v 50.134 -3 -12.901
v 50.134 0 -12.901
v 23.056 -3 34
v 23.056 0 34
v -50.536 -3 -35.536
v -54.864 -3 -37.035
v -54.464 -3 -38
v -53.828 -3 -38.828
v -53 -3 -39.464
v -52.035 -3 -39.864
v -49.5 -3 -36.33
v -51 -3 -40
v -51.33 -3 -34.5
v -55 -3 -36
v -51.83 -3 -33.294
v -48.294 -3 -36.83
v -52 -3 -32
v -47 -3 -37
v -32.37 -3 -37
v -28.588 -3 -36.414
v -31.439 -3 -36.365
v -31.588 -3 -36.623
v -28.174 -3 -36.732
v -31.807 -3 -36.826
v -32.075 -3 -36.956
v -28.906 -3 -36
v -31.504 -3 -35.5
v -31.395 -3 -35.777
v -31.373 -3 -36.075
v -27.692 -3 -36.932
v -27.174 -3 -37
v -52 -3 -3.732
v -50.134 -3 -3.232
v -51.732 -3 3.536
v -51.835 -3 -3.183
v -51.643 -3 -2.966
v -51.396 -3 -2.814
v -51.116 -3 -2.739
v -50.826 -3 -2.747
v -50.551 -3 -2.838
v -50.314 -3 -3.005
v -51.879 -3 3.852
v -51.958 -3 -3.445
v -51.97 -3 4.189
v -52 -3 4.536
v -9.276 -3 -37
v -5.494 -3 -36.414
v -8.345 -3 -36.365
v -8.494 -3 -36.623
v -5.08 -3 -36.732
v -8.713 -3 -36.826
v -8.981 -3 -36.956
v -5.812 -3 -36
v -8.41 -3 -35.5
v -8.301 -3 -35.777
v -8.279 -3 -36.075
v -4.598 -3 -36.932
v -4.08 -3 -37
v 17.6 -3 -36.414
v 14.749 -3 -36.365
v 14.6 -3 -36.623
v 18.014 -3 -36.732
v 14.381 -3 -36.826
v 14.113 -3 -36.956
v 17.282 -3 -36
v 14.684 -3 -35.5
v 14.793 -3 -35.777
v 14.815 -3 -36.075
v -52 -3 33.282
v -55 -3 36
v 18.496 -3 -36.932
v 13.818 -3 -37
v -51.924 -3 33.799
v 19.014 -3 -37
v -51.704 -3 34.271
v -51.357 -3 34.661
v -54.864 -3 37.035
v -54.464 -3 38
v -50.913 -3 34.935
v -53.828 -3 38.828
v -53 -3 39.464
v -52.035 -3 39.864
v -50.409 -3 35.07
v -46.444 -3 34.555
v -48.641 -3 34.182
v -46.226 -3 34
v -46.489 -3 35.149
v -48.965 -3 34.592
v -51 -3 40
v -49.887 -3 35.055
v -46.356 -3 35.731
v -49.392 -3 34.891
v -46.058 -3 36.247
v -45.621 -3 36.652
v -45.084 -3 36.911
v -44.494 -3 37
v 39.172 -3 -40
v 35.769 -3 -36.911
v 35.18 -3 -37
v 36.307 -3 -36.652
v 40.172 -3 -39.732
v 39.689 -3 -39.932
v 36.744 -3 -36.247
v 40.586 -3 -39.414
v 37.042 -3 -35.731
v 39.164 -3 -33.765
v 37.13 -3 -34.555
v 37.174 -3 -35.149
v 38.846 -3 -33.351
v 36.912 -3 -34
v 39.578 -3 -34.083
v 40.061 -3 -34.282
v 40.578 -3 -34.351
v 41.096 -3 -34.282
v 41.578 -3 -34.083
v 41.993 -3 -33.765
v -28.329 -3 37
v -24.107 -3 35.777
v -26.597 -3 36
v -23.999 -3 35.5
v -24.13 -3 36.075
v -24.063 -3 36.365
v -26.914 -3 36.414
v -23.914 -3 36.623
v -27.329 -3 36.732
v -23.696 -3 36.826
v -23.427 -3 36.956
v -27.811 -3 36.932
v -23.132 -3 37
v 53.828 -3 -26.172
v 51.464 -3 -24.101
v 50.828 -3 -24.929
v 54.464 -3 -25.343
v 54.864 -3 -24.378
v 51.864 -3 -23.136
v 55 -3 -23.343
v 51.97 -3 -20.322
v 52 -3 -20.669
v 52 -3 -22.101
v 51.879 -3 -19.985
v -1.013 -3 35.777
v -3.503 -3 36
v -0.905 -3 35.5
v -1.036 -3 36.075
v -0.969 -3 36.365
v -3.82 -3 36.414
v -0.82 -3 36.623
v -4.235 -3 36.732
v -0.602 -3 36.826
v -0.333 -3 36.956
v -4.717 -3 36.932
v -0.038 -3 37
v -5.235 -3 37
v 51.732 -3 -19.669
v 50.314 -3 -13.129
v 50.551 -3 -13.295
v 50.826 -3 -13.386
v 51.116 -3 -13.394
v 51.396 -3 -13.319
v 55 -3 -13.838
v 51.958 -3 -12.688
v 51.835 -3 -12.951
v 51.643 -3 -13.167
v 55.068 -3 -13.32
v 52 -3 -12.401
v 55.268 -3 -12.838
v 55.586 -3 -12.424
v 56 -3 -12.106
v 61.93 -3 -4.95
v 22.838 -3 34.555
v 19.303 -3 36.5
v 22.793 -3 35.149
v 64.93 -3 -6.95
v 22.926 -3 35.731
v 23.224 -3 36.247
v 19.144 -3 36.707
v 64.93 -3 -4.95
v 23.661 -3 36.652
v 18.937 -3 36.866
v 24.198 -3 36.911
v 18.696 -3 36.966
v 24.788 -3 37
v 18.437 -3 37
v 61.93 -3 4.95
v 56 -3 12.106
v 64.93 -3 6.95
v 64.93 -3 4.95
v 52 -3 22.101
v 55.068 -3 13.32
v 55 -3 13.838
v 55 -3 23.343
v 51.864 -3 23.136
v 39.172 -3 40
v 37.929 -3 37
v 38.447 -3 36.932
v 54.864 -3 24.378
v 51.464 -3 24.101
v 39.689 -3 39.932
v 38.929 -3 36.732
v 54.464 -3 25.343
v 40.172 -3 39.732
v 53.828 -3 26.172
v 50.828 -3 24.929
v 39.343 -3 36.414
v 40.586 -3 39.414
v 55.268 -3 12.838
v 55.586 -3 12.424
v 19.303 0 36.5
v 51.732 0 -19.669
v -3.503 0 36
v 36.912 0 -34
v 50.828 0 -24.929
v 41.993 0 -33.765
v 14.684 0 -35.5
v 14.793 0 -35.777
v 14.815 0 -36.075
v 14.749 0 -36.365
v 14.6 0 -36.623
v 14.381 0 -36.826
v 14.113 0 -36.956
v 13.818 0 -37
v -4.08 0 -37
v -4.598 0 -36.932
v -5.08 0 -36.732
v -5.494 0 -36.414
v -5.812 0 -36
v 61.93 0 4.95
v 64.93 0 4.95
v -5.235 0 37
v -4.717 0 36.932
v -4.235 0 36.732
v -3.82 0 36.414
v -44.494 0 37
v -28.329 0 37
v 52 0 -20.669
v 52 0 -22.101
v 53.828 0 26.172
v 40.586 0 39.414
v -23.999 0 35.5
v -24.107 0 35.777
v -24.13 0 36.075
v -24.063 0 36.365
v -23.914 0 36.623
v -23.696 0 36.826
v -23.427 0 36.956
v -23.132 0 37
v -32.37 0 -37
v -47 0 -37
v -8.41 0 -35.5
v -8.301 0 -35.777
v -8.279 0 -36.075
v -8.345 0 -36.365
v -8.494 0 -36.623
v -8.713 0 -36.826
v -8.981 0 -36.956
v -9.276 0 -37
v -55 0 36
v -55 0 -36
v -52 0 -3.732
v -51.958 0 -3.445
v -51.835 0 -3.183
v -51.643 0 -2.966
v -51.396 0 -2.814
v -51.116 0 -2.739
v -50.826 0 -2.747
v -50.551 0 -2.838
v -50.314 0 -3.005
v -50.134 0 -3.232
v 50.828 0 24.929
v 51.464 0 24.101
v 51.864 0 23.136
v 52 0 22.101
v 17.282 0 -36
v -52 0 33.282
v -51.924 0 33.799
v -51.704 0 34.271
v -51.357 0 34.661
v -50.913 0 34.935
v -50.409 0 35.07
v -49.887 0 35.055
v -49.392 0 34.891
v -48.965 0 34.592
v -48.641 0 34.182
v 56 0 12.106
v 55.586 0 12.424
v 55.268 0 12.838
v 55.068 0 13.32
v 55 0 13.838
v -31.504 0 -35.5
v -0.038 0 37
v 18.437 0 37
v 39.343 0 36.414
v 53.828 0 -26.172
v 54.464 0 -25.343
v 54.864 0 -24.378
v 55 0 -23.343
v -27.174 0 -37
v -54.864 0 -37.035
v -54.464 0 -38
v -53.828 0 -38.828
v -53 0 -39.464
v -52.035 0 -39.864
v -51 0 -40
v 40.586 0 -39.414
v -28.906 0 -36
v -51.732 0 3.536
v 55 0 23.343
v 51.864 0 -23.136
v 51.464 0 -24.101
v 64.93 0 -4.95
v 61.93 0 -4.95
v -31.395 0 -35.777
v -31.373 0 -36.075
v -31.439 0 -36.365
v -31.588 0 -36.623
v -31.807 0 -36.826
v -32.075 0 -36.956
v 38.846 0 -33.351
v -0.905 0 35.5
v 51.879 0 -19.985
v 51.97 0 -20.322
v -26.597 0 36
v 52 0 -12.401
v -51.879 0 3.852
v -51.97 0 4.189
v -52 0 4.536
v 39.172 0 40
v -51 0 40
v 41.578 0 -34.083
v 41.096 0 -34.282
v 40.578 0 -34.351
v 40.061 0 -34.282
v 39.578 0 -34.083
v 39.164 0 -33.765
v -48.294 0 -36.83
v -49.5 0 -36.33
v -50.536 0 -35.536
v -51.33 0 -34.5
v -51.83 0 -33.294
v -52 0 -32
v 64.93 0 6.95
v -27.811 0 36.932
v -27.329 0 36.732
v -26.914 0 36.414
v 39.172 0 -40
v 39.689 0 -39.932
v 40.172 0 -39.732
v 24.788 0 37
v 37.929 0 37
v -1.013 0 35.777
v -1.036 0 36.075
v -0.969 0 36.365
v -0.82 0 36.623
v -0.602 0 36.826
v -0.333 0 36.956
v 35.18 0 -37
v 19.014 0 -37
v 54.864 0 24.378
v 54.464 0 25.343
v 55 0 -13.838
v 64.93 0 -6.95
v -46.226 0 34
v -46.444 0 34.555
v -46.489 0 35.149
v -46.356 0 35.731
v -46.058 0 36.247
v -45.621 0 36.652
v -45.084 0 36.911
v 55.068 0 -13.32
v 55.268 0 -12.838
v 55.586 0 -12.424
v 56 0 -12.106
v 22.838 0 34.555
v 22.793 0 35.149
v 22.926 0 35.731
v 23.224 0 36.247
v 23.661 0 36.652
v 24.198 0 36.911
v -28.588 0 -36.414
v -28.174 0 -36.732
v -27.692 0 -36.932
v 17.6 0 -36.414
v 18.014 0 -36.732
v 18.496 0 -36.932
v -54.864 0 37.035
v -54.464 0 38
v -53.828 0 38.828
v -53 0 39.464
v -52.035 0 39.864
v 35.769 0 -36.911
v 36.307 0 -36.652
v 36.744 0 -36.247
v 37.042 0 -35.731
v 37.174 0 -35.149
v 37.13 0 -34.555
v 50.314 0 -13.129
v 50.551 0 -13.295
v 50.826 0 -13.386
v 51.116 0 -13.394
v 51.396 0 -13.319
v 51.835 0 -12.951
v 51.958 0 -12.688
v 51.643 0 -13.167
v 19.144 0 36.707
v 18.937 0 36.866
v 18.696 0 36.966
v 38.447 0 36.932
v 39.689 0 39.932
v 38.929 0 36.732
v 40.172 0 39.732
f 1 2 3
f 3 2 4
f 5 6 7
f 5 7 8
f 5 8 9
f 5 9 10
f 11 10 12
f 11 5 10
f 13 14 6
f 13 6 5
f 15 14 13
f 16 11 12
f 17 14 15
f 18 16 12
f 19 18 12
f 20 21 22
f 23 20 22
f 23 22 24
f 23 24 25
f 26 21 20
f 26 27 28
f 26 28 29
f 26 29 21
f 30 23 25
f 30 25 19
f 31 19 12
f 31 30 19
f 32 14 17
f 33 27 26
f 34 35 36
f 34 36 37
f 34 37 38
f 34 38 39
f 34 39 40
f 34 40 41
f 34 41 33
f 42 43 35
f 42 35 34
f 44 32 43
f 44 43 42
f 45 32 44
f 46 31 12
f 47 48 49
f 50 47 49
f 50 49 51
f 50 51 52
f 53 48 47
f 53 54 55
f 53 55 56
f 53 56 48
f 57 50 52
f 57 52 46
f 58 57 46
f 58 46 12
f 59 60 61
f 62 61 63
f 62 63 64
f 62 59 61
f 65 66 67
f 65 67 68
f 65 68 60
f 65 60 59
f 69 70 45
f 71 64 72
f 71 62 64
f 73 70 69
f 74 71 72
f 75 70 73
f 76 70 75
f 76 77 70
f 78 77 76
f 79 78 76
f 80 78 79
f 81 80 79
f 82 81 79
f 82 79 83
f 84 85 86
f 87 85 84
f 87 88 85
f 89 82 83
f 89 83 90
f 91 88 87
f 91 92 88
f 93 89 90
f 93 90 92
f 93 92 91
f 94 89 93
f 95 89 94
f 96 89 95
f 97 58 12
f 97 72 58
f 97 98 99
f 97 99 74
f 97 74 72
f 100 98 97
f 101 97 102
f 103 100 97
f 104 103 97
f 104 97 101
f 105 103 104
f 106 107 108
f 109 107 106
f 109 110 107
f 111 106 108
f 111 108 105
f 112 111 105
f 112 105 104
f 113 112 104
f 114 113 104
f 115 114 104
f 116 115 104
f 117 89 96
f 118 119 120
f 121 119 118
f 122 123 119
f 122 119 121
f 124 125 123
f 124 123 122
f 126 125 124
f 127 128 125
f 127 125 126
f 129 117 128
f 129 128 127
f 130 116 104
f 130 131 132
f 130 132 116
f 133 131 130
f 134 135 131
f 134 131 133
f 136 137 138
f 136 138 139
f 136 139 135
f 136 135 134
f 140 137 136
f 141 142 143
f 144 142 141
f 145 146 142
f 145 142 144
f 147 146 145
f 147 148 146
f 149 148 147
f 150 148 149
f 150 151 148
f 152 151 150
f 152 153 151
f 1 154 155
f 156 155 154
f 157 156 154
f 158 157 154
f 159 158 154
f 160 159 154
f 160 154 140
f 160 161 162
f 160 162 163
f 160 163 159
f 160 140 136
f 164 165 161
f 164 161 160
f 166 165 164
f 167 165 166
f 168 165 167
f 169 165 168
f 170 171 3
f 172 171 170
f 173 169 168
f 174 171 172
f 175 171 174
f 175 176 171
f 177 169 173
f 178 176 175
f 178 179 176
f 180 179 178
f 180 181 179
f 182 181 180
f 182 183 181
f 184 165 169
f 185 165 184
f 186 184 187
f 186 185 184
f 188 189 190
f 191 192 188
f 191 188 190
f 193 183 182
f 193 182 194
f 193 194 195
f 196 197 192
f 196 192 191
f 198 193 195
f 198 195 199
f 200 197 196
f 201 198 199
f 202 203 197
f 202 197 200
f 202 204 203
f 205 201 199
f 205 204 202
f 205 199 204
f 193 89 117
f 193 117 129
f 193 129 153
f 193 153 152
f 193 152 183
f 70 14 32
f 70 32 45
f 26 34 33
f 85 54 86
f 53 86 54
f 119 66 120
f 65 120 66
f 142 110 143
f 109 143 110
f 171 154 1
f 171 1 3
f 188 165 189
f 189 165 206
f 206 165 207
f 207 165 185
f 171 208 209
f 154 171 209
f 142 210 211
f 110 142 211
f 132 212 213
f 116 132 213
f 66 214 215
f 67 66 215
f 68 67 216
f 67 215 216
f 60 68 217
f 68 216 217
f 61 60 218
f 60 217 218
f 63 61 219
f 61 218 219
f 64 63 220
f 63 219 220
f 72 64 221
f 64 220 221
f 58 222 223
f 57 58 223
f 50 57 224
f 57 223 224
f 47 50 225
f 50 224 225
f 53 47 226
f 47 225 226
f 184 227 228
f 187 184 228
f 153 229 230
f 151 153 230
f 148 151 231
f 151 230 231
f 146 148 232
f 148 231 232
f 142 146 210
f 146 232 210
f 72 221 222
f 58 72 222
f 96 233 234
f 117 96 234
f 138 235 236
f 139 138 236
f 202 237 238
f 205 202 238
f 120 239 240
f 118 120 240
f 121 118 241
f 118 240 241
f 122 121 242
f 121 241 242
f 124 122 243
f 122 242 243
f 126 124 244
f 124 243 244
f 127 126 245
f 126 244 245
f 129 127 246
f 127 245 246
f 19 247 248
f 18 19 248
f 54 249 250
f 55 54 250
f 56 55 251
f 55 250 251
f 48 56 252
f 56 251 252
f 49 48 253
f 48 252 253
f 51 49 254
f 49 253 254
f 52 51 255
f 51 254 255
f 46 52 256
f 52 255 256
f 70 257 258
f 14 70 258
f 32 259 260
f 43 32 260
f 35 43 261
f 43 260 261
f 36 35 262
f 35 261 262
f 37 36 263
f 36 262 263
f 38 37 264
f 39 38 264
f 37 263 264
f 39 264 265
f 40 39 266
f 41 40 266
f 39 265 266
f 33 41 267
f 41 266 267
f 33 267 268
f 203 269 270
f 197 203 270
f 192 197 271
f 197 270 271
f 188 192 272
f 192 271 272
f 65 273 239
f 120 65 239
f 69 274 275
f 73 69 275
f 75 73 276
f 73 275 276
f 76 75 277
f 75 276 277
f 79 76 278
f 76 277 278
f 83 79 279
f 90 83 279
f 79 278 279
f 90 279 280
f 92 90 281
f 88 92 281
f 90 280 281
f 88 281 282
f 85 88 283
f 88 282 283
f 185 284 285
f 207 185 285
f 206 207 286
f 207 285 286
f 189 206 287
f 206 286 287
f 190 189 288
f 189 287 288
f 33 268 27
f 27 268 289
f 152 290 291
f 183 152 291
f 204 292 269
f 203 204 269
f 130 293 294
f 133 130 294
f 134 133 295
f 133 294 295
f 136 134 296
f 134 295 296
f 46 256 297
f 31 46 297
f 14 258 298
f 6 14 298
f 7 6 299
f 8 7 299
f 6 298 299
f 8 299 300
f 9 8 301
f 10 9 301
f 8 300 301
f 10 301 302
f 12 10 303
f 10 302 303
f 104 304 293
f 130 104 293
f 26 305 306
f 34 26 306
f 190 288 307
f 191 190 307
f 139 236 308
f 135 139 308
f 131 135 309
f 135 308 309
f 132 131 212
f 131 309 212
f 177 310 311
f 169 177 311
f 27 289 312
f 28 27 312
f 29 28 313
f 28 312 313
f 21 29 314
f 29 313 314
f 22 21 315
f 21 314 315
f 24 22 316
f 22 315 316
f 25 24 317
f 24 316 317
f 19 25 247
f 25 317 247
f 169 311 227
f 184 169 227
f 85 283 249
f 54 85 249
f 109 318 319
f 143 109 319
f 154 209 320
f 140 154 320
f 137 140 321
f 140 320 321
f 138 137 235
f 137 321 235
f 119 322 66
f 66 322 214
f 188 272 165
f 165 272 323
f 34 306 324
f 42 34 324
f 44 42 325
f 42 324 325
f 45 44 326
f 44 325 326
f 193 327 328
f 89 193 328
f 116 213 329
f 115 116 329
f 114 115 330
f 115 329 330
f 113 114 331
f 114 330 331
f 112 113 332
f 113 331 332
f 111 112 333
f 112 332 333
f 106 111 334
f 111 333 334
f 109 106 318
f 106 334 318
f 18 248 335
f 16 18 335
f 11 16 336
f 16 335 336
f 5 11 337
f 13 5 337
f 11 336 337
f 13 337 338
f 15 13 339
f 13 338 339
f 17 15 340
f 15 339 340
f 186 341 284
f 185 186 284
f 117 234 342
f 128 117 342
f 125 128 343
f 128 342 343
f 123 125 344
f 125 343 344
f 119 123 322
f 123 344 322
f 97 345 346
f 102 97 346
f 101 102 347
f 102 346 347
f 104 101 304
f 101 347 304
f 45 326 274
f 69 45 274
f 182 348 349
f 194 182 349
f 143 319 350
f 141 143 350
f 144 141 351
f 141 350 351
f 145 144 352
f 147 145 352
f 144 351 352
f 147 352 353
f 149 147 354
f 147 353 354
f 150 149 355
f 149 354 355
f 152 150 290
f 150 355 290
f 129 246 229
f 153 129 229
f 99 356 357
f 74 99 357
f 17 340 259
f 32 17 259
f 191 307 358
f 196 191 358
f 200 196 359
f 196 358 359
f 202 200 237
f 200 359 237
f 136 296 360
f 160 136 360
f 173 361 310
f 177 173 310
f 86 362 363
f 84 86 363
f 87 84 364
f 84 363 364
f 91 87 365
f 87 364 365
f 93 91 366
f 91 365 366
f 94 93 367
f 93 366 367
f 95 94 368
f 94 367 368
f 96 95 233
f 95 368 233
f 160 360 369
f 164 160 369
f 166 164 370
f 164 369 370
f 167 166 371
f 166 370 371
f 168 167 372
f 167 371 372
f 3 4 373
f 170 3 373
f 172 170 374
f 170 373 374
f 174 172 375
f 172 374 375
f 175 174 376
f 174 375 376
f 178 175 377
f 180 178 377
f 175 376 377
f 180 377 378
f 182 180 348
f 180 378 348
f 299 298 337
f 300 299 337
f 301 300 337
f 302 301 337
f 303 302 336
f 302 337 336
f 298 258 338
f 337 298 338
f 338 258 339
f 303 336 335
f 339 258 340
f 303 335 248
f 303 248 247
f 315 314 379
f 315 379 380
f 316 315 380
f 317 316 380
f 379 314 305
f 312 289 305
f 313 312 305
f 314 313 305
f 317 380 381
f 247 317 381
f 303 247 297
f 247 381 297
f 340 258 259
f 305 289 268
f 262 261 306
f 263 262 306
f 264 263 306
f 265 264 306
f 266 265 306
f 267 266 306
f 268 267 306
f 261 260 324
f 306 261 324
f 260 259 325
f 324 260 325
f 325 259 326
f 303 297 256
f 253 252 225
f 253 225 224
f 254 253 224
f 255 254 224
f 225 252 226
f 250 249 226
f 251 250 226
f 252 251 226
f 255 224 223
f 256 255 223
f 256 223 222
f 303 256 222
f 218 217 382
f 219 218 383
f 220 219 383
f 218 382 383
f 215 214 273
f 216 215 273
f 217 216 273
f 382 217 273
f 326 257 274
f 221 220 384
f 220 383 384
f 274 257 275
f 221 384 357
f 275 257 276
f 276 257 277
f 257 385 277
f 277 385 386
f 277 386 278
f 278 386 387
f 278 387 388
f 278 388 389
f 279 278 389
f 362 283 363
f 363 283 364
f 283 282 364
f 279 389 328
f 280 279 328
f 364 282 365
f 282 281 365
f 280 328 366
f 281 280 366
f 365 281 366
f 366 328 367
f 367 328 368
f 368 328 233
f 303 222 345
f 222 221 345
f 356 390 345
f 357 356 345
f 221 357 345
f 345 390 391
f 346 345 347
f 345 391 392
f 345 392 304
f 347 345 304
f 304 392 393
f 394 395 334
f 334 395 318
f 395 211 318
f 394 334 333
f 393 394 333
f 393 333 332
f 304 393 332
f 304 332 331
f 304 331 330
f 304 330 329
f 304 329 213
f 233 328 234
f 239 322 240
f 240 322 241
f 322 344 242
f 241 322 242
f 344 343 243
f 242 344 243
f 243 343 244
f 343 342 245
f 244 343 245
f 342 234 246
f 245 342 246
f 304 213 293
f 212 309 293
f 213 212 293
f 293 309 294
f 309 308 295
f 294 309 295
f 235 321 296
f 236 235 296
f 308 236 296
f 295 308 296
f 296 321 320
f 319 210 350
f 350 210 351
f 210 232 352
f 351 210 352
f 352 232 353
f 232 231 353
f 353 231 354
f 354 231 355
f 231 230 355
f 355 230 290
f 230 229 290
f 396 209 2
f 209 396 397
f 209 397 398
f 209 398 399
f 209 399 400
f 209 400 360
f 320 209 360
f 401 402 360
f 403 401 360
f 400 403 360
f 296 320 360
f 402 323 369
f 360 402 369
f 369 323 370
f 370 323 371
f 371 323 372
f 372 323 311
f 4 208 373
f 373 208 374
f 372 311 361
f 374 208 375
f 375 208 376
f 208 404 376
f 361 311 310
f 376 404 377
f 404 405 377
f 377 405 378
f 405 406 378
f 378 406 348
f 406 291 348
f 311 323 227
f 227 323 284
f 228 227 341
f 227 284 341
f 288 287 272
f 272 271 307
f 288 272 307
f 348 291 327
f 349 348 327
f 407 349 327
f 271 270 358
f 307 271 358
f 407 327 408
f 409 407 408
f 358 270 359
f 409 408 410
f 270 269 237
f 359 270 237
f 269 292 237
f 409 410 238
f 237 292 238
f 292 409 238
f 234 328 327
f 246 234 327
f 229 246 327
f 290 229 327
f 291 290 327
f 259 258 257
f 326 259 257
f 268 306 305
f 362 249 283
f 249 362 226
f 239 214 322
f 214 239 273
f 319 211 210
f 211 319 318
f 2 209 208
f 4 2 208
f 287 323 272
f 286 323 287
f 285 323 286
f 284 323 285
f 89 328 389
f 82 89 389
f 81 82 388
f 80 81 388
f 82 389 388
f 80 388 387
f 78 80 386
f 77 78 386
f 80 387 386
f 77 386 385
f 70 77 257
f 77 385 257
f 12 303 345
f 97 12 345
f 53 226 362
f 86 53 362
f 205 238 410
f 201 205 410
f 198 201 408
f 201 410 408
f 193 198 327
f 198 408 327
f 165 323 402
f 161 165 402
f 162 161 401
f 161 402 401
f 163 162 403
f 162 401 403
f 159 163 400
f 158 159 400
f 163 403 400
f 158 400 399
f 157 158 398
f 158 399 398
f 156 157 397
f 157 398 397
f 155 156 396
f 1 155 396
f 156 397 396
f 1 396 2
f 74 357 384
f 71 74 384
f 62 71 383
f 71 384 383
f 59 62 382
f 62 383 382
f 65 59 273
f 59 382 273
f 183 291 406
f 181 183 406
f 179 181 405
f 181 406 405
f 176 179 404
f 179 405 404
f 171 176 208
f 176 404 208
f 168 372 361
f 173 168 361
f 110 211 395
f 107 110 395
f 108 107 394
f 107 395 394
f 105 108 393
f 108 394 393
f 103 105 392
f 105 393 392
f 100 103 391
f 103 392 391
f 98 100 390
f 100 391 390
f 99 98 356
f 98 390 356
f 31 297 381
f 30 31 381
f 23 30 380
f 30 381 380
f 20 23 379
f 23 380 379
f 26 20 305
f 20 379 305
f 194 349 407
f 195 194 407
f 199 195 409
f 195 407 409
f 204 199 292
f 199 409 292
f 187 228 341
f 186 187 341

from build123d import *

# Parameters (mm, degrees)
F1_DEPTH = 3


with BuildPart() as f1:
    # F0 (on Front) → F1 (new body)
    with BuildSketch(Plane.XZ):
        with BuildLine():
            ThreePointArc((-55, -36), (-53.828427, -38.828427), (-51, -40))
            Line((-51, -40), (39.171573, -40))
            ThreePointArc((39.171573, -40), (39.93694, -39.847759), (40.585786, -39.414214))
            Line((40.585786, -39.414214), (53.828427, -26.171573))
            ThreePointArc((53.828427, -26.171573), (54.695518, -24.873879), (55, -23.343146))
            Line((55, -23.343146), (55, -13.837789))
            ThreePointArc((55, -13.837789), (55.267949, -12.837789), (56, -12.105738))
            Line((56, -12.105738), (64.93, -6.95))
            Line((64.93, -6.95), (64.93, -4.95))
            Line((64.93, -4.95), (61.93, -4.95))
            Line((61.93, -4.95), (61.93, 4.95))
            Line((61.93, 4.95), (64.93, 4.95))
            Line((64.93, 4.95), (64.93, 6.95))
            Line((64.93, 6.95), (56, 12.105738))
            ThreePointArc((56, 12.105738), (55.267949, 12.837789), (55, 13.837789))
            Line((55, 13.837789), (55, 23.343146))
            ThreePointArc((55, 23.343146), (54.695518, 24.873879), (53.828427, 26.171573))
            Line((53.828427, 26.171573), (40.585786, 39.414214))
            ThreePointArc((40.585786, 39.414214), (39.93694, 39.847759), (39.171573, 40))
            Line((39.171573, 40), (35.757359, 40))
            Line((35.757359, 40), (-51, 40))
            ThreePointArc((-51, 40), (-53.828427, 38.828427), (-55, 36))
            Line((-55, 36), (-55, -36))
        make_face()
        with BuildLine():
            ThreePointArc((-47, -37), (-50.535534, -35.535534), (-52, -32))
            Line((-52, -32), (-52, -3.732051))
            ThreePointArc((-52, -3.732051), (-51.258819, -2.766125), (-50.133975, -3.232051))
            Line((-50.133975, -3.232051), (-31.504065, -35.5))
            ThreePointArc((-31.504065, -35.5), (-31.504065, -36.5), (-32.370091, -37))
            Line((-32.370091, -37), (-47, -37))
        make_face(mode=Mode.SUBTRACT)
        with BuildLine():
            Line((-28.905989, -36), (-51.732051, 3.535898))
            ThreePointArc((-51.732051, 3.535898), (-51.931852, 4.01826), (-52, 4.535898))
            Line((-52, 4.535898), (-52, 33.282309))
            ThreePointArc((-52, 33.282309), (-50.665874, 35.020975), (-48.641154, 34.182309))
            Line((-48.641154, 34.182309), (-8.410055, -35.5))
            ThreePointArc((-8.410055, -35.5), (-8.410055, -36.5), (-9.27608, -37))
            Line((-9.27608, -37), (-27.173938, -37))
            ThreePointArc((-27.173938, -37), (-28.173938, -36.732051), (-28.905989, -36))
        make_face(mode=Mode.SUBTRACT)
        with BuildLine():
            ThreePointArc((-46.226497, 34), (-46.226497, 36), (-44.494447, 37))
            Line((-44.494447, 37), (-28.328639, 37))
            ThreePointArc((-28.328639, 37), (-27.328639, 36.732051), (-26.596588, 36))
            Line((-26.596588, 36), (14.683956, -35.5))
            ThreePointArc((14.683956, -35.5), (14.683956, -36.5), (13.817931, -37))
            Line((13.817931, -37), (-4.079928, -37))
            ThreePointArc((-4.079928, -37), (-5.079928, -36.732051), (-5.811978, -36))
            Line((-5.811978, -36), (-46.226497, 34))
        make_face(mode=Mode.SUBTRACT)
        with BuildLine():
            Line((17.282032, -36), (-23.998512, 35.5))
            ThreePointArc((-23.998512, 35.5), (-23.998512, 36.5), (-23.132487, 37))
            Line((-23.132487, 37), (-5.234628, 37))
            ThreePointArc((-5.234628, 37), (-4.234628, 36.732051), (-3.502577, 36))
            Line((-3.502577, 36), (36.911941, -34))
            ThreePointArc((36.911941, -34), (36.911941, -36), (35.179891, -37))
            Line((35.179891, -37), (19.014083, -37))
            ThreePointArc((19.014083, -37), (18.014083, -36.732051), (17.282032, -36))
        make_face(mode=Mode.SUBTRACT)
        with BuildLine():
            Line((52, -20.669182), (52, -22.100505))
            ThreePointArc((52, -22.100505), (51.695518, -23.631239), (50.828427, -24.928932))
            Line((50.828427, -24.928932), (41.992628, -33.764731))
            ThreePointArc((41.992628, -33.764731), (40.317362, -34.333407), (38.846364, -33.350518))
            Line((38.846364, -33.350518), (-0.904501, 35.5))
            ThreePointArc((-0.904501, 35.5), (-0.904501, 36.5), (-0.038476, 37))
            Line((-0.038476, 37), (18.436733, 37))
            ThreePointArc((18.436733, 37), (18.936733, 36.866025), (19.302758, 36.5))
            Line((19.302758, 36.5), (51.732051, -19.669182))
            ThreePointArc((51.732051, -19.669182), (51.931852, -20.151544), (52, -20.669182))
        make_face(mode=Mode.SUBTRACT)
        with BuildLine():
            Line((50.133975, -12.901233), (23.055535, 34))
            ThreePointArc((23.055535, 34), (23.055535, 36), (24.787586, 37))
            Line((24.787586, 37), (37.928932, 37))
            ThreePointArc((37.928932, 37), (38.694299, 36.847759), (39.343146, 36.414214))
            Line((39.343146, 36.414214), (50.828427, 24.928932))
            ThreePointArc((50.828427, 24.928932), (51.695518, 23.631239), (52, 22.100505))
            Line((52, 22.100505), (52, -12.401233))
            ThreePointArc((52, -12.401233), (51.258819, -13.367159), (50.133975, -12.901233))
        make_face(mode=Mode.SUBTRACT)
    extrude(amount=F1_DEPTH)


solid = f1.part
